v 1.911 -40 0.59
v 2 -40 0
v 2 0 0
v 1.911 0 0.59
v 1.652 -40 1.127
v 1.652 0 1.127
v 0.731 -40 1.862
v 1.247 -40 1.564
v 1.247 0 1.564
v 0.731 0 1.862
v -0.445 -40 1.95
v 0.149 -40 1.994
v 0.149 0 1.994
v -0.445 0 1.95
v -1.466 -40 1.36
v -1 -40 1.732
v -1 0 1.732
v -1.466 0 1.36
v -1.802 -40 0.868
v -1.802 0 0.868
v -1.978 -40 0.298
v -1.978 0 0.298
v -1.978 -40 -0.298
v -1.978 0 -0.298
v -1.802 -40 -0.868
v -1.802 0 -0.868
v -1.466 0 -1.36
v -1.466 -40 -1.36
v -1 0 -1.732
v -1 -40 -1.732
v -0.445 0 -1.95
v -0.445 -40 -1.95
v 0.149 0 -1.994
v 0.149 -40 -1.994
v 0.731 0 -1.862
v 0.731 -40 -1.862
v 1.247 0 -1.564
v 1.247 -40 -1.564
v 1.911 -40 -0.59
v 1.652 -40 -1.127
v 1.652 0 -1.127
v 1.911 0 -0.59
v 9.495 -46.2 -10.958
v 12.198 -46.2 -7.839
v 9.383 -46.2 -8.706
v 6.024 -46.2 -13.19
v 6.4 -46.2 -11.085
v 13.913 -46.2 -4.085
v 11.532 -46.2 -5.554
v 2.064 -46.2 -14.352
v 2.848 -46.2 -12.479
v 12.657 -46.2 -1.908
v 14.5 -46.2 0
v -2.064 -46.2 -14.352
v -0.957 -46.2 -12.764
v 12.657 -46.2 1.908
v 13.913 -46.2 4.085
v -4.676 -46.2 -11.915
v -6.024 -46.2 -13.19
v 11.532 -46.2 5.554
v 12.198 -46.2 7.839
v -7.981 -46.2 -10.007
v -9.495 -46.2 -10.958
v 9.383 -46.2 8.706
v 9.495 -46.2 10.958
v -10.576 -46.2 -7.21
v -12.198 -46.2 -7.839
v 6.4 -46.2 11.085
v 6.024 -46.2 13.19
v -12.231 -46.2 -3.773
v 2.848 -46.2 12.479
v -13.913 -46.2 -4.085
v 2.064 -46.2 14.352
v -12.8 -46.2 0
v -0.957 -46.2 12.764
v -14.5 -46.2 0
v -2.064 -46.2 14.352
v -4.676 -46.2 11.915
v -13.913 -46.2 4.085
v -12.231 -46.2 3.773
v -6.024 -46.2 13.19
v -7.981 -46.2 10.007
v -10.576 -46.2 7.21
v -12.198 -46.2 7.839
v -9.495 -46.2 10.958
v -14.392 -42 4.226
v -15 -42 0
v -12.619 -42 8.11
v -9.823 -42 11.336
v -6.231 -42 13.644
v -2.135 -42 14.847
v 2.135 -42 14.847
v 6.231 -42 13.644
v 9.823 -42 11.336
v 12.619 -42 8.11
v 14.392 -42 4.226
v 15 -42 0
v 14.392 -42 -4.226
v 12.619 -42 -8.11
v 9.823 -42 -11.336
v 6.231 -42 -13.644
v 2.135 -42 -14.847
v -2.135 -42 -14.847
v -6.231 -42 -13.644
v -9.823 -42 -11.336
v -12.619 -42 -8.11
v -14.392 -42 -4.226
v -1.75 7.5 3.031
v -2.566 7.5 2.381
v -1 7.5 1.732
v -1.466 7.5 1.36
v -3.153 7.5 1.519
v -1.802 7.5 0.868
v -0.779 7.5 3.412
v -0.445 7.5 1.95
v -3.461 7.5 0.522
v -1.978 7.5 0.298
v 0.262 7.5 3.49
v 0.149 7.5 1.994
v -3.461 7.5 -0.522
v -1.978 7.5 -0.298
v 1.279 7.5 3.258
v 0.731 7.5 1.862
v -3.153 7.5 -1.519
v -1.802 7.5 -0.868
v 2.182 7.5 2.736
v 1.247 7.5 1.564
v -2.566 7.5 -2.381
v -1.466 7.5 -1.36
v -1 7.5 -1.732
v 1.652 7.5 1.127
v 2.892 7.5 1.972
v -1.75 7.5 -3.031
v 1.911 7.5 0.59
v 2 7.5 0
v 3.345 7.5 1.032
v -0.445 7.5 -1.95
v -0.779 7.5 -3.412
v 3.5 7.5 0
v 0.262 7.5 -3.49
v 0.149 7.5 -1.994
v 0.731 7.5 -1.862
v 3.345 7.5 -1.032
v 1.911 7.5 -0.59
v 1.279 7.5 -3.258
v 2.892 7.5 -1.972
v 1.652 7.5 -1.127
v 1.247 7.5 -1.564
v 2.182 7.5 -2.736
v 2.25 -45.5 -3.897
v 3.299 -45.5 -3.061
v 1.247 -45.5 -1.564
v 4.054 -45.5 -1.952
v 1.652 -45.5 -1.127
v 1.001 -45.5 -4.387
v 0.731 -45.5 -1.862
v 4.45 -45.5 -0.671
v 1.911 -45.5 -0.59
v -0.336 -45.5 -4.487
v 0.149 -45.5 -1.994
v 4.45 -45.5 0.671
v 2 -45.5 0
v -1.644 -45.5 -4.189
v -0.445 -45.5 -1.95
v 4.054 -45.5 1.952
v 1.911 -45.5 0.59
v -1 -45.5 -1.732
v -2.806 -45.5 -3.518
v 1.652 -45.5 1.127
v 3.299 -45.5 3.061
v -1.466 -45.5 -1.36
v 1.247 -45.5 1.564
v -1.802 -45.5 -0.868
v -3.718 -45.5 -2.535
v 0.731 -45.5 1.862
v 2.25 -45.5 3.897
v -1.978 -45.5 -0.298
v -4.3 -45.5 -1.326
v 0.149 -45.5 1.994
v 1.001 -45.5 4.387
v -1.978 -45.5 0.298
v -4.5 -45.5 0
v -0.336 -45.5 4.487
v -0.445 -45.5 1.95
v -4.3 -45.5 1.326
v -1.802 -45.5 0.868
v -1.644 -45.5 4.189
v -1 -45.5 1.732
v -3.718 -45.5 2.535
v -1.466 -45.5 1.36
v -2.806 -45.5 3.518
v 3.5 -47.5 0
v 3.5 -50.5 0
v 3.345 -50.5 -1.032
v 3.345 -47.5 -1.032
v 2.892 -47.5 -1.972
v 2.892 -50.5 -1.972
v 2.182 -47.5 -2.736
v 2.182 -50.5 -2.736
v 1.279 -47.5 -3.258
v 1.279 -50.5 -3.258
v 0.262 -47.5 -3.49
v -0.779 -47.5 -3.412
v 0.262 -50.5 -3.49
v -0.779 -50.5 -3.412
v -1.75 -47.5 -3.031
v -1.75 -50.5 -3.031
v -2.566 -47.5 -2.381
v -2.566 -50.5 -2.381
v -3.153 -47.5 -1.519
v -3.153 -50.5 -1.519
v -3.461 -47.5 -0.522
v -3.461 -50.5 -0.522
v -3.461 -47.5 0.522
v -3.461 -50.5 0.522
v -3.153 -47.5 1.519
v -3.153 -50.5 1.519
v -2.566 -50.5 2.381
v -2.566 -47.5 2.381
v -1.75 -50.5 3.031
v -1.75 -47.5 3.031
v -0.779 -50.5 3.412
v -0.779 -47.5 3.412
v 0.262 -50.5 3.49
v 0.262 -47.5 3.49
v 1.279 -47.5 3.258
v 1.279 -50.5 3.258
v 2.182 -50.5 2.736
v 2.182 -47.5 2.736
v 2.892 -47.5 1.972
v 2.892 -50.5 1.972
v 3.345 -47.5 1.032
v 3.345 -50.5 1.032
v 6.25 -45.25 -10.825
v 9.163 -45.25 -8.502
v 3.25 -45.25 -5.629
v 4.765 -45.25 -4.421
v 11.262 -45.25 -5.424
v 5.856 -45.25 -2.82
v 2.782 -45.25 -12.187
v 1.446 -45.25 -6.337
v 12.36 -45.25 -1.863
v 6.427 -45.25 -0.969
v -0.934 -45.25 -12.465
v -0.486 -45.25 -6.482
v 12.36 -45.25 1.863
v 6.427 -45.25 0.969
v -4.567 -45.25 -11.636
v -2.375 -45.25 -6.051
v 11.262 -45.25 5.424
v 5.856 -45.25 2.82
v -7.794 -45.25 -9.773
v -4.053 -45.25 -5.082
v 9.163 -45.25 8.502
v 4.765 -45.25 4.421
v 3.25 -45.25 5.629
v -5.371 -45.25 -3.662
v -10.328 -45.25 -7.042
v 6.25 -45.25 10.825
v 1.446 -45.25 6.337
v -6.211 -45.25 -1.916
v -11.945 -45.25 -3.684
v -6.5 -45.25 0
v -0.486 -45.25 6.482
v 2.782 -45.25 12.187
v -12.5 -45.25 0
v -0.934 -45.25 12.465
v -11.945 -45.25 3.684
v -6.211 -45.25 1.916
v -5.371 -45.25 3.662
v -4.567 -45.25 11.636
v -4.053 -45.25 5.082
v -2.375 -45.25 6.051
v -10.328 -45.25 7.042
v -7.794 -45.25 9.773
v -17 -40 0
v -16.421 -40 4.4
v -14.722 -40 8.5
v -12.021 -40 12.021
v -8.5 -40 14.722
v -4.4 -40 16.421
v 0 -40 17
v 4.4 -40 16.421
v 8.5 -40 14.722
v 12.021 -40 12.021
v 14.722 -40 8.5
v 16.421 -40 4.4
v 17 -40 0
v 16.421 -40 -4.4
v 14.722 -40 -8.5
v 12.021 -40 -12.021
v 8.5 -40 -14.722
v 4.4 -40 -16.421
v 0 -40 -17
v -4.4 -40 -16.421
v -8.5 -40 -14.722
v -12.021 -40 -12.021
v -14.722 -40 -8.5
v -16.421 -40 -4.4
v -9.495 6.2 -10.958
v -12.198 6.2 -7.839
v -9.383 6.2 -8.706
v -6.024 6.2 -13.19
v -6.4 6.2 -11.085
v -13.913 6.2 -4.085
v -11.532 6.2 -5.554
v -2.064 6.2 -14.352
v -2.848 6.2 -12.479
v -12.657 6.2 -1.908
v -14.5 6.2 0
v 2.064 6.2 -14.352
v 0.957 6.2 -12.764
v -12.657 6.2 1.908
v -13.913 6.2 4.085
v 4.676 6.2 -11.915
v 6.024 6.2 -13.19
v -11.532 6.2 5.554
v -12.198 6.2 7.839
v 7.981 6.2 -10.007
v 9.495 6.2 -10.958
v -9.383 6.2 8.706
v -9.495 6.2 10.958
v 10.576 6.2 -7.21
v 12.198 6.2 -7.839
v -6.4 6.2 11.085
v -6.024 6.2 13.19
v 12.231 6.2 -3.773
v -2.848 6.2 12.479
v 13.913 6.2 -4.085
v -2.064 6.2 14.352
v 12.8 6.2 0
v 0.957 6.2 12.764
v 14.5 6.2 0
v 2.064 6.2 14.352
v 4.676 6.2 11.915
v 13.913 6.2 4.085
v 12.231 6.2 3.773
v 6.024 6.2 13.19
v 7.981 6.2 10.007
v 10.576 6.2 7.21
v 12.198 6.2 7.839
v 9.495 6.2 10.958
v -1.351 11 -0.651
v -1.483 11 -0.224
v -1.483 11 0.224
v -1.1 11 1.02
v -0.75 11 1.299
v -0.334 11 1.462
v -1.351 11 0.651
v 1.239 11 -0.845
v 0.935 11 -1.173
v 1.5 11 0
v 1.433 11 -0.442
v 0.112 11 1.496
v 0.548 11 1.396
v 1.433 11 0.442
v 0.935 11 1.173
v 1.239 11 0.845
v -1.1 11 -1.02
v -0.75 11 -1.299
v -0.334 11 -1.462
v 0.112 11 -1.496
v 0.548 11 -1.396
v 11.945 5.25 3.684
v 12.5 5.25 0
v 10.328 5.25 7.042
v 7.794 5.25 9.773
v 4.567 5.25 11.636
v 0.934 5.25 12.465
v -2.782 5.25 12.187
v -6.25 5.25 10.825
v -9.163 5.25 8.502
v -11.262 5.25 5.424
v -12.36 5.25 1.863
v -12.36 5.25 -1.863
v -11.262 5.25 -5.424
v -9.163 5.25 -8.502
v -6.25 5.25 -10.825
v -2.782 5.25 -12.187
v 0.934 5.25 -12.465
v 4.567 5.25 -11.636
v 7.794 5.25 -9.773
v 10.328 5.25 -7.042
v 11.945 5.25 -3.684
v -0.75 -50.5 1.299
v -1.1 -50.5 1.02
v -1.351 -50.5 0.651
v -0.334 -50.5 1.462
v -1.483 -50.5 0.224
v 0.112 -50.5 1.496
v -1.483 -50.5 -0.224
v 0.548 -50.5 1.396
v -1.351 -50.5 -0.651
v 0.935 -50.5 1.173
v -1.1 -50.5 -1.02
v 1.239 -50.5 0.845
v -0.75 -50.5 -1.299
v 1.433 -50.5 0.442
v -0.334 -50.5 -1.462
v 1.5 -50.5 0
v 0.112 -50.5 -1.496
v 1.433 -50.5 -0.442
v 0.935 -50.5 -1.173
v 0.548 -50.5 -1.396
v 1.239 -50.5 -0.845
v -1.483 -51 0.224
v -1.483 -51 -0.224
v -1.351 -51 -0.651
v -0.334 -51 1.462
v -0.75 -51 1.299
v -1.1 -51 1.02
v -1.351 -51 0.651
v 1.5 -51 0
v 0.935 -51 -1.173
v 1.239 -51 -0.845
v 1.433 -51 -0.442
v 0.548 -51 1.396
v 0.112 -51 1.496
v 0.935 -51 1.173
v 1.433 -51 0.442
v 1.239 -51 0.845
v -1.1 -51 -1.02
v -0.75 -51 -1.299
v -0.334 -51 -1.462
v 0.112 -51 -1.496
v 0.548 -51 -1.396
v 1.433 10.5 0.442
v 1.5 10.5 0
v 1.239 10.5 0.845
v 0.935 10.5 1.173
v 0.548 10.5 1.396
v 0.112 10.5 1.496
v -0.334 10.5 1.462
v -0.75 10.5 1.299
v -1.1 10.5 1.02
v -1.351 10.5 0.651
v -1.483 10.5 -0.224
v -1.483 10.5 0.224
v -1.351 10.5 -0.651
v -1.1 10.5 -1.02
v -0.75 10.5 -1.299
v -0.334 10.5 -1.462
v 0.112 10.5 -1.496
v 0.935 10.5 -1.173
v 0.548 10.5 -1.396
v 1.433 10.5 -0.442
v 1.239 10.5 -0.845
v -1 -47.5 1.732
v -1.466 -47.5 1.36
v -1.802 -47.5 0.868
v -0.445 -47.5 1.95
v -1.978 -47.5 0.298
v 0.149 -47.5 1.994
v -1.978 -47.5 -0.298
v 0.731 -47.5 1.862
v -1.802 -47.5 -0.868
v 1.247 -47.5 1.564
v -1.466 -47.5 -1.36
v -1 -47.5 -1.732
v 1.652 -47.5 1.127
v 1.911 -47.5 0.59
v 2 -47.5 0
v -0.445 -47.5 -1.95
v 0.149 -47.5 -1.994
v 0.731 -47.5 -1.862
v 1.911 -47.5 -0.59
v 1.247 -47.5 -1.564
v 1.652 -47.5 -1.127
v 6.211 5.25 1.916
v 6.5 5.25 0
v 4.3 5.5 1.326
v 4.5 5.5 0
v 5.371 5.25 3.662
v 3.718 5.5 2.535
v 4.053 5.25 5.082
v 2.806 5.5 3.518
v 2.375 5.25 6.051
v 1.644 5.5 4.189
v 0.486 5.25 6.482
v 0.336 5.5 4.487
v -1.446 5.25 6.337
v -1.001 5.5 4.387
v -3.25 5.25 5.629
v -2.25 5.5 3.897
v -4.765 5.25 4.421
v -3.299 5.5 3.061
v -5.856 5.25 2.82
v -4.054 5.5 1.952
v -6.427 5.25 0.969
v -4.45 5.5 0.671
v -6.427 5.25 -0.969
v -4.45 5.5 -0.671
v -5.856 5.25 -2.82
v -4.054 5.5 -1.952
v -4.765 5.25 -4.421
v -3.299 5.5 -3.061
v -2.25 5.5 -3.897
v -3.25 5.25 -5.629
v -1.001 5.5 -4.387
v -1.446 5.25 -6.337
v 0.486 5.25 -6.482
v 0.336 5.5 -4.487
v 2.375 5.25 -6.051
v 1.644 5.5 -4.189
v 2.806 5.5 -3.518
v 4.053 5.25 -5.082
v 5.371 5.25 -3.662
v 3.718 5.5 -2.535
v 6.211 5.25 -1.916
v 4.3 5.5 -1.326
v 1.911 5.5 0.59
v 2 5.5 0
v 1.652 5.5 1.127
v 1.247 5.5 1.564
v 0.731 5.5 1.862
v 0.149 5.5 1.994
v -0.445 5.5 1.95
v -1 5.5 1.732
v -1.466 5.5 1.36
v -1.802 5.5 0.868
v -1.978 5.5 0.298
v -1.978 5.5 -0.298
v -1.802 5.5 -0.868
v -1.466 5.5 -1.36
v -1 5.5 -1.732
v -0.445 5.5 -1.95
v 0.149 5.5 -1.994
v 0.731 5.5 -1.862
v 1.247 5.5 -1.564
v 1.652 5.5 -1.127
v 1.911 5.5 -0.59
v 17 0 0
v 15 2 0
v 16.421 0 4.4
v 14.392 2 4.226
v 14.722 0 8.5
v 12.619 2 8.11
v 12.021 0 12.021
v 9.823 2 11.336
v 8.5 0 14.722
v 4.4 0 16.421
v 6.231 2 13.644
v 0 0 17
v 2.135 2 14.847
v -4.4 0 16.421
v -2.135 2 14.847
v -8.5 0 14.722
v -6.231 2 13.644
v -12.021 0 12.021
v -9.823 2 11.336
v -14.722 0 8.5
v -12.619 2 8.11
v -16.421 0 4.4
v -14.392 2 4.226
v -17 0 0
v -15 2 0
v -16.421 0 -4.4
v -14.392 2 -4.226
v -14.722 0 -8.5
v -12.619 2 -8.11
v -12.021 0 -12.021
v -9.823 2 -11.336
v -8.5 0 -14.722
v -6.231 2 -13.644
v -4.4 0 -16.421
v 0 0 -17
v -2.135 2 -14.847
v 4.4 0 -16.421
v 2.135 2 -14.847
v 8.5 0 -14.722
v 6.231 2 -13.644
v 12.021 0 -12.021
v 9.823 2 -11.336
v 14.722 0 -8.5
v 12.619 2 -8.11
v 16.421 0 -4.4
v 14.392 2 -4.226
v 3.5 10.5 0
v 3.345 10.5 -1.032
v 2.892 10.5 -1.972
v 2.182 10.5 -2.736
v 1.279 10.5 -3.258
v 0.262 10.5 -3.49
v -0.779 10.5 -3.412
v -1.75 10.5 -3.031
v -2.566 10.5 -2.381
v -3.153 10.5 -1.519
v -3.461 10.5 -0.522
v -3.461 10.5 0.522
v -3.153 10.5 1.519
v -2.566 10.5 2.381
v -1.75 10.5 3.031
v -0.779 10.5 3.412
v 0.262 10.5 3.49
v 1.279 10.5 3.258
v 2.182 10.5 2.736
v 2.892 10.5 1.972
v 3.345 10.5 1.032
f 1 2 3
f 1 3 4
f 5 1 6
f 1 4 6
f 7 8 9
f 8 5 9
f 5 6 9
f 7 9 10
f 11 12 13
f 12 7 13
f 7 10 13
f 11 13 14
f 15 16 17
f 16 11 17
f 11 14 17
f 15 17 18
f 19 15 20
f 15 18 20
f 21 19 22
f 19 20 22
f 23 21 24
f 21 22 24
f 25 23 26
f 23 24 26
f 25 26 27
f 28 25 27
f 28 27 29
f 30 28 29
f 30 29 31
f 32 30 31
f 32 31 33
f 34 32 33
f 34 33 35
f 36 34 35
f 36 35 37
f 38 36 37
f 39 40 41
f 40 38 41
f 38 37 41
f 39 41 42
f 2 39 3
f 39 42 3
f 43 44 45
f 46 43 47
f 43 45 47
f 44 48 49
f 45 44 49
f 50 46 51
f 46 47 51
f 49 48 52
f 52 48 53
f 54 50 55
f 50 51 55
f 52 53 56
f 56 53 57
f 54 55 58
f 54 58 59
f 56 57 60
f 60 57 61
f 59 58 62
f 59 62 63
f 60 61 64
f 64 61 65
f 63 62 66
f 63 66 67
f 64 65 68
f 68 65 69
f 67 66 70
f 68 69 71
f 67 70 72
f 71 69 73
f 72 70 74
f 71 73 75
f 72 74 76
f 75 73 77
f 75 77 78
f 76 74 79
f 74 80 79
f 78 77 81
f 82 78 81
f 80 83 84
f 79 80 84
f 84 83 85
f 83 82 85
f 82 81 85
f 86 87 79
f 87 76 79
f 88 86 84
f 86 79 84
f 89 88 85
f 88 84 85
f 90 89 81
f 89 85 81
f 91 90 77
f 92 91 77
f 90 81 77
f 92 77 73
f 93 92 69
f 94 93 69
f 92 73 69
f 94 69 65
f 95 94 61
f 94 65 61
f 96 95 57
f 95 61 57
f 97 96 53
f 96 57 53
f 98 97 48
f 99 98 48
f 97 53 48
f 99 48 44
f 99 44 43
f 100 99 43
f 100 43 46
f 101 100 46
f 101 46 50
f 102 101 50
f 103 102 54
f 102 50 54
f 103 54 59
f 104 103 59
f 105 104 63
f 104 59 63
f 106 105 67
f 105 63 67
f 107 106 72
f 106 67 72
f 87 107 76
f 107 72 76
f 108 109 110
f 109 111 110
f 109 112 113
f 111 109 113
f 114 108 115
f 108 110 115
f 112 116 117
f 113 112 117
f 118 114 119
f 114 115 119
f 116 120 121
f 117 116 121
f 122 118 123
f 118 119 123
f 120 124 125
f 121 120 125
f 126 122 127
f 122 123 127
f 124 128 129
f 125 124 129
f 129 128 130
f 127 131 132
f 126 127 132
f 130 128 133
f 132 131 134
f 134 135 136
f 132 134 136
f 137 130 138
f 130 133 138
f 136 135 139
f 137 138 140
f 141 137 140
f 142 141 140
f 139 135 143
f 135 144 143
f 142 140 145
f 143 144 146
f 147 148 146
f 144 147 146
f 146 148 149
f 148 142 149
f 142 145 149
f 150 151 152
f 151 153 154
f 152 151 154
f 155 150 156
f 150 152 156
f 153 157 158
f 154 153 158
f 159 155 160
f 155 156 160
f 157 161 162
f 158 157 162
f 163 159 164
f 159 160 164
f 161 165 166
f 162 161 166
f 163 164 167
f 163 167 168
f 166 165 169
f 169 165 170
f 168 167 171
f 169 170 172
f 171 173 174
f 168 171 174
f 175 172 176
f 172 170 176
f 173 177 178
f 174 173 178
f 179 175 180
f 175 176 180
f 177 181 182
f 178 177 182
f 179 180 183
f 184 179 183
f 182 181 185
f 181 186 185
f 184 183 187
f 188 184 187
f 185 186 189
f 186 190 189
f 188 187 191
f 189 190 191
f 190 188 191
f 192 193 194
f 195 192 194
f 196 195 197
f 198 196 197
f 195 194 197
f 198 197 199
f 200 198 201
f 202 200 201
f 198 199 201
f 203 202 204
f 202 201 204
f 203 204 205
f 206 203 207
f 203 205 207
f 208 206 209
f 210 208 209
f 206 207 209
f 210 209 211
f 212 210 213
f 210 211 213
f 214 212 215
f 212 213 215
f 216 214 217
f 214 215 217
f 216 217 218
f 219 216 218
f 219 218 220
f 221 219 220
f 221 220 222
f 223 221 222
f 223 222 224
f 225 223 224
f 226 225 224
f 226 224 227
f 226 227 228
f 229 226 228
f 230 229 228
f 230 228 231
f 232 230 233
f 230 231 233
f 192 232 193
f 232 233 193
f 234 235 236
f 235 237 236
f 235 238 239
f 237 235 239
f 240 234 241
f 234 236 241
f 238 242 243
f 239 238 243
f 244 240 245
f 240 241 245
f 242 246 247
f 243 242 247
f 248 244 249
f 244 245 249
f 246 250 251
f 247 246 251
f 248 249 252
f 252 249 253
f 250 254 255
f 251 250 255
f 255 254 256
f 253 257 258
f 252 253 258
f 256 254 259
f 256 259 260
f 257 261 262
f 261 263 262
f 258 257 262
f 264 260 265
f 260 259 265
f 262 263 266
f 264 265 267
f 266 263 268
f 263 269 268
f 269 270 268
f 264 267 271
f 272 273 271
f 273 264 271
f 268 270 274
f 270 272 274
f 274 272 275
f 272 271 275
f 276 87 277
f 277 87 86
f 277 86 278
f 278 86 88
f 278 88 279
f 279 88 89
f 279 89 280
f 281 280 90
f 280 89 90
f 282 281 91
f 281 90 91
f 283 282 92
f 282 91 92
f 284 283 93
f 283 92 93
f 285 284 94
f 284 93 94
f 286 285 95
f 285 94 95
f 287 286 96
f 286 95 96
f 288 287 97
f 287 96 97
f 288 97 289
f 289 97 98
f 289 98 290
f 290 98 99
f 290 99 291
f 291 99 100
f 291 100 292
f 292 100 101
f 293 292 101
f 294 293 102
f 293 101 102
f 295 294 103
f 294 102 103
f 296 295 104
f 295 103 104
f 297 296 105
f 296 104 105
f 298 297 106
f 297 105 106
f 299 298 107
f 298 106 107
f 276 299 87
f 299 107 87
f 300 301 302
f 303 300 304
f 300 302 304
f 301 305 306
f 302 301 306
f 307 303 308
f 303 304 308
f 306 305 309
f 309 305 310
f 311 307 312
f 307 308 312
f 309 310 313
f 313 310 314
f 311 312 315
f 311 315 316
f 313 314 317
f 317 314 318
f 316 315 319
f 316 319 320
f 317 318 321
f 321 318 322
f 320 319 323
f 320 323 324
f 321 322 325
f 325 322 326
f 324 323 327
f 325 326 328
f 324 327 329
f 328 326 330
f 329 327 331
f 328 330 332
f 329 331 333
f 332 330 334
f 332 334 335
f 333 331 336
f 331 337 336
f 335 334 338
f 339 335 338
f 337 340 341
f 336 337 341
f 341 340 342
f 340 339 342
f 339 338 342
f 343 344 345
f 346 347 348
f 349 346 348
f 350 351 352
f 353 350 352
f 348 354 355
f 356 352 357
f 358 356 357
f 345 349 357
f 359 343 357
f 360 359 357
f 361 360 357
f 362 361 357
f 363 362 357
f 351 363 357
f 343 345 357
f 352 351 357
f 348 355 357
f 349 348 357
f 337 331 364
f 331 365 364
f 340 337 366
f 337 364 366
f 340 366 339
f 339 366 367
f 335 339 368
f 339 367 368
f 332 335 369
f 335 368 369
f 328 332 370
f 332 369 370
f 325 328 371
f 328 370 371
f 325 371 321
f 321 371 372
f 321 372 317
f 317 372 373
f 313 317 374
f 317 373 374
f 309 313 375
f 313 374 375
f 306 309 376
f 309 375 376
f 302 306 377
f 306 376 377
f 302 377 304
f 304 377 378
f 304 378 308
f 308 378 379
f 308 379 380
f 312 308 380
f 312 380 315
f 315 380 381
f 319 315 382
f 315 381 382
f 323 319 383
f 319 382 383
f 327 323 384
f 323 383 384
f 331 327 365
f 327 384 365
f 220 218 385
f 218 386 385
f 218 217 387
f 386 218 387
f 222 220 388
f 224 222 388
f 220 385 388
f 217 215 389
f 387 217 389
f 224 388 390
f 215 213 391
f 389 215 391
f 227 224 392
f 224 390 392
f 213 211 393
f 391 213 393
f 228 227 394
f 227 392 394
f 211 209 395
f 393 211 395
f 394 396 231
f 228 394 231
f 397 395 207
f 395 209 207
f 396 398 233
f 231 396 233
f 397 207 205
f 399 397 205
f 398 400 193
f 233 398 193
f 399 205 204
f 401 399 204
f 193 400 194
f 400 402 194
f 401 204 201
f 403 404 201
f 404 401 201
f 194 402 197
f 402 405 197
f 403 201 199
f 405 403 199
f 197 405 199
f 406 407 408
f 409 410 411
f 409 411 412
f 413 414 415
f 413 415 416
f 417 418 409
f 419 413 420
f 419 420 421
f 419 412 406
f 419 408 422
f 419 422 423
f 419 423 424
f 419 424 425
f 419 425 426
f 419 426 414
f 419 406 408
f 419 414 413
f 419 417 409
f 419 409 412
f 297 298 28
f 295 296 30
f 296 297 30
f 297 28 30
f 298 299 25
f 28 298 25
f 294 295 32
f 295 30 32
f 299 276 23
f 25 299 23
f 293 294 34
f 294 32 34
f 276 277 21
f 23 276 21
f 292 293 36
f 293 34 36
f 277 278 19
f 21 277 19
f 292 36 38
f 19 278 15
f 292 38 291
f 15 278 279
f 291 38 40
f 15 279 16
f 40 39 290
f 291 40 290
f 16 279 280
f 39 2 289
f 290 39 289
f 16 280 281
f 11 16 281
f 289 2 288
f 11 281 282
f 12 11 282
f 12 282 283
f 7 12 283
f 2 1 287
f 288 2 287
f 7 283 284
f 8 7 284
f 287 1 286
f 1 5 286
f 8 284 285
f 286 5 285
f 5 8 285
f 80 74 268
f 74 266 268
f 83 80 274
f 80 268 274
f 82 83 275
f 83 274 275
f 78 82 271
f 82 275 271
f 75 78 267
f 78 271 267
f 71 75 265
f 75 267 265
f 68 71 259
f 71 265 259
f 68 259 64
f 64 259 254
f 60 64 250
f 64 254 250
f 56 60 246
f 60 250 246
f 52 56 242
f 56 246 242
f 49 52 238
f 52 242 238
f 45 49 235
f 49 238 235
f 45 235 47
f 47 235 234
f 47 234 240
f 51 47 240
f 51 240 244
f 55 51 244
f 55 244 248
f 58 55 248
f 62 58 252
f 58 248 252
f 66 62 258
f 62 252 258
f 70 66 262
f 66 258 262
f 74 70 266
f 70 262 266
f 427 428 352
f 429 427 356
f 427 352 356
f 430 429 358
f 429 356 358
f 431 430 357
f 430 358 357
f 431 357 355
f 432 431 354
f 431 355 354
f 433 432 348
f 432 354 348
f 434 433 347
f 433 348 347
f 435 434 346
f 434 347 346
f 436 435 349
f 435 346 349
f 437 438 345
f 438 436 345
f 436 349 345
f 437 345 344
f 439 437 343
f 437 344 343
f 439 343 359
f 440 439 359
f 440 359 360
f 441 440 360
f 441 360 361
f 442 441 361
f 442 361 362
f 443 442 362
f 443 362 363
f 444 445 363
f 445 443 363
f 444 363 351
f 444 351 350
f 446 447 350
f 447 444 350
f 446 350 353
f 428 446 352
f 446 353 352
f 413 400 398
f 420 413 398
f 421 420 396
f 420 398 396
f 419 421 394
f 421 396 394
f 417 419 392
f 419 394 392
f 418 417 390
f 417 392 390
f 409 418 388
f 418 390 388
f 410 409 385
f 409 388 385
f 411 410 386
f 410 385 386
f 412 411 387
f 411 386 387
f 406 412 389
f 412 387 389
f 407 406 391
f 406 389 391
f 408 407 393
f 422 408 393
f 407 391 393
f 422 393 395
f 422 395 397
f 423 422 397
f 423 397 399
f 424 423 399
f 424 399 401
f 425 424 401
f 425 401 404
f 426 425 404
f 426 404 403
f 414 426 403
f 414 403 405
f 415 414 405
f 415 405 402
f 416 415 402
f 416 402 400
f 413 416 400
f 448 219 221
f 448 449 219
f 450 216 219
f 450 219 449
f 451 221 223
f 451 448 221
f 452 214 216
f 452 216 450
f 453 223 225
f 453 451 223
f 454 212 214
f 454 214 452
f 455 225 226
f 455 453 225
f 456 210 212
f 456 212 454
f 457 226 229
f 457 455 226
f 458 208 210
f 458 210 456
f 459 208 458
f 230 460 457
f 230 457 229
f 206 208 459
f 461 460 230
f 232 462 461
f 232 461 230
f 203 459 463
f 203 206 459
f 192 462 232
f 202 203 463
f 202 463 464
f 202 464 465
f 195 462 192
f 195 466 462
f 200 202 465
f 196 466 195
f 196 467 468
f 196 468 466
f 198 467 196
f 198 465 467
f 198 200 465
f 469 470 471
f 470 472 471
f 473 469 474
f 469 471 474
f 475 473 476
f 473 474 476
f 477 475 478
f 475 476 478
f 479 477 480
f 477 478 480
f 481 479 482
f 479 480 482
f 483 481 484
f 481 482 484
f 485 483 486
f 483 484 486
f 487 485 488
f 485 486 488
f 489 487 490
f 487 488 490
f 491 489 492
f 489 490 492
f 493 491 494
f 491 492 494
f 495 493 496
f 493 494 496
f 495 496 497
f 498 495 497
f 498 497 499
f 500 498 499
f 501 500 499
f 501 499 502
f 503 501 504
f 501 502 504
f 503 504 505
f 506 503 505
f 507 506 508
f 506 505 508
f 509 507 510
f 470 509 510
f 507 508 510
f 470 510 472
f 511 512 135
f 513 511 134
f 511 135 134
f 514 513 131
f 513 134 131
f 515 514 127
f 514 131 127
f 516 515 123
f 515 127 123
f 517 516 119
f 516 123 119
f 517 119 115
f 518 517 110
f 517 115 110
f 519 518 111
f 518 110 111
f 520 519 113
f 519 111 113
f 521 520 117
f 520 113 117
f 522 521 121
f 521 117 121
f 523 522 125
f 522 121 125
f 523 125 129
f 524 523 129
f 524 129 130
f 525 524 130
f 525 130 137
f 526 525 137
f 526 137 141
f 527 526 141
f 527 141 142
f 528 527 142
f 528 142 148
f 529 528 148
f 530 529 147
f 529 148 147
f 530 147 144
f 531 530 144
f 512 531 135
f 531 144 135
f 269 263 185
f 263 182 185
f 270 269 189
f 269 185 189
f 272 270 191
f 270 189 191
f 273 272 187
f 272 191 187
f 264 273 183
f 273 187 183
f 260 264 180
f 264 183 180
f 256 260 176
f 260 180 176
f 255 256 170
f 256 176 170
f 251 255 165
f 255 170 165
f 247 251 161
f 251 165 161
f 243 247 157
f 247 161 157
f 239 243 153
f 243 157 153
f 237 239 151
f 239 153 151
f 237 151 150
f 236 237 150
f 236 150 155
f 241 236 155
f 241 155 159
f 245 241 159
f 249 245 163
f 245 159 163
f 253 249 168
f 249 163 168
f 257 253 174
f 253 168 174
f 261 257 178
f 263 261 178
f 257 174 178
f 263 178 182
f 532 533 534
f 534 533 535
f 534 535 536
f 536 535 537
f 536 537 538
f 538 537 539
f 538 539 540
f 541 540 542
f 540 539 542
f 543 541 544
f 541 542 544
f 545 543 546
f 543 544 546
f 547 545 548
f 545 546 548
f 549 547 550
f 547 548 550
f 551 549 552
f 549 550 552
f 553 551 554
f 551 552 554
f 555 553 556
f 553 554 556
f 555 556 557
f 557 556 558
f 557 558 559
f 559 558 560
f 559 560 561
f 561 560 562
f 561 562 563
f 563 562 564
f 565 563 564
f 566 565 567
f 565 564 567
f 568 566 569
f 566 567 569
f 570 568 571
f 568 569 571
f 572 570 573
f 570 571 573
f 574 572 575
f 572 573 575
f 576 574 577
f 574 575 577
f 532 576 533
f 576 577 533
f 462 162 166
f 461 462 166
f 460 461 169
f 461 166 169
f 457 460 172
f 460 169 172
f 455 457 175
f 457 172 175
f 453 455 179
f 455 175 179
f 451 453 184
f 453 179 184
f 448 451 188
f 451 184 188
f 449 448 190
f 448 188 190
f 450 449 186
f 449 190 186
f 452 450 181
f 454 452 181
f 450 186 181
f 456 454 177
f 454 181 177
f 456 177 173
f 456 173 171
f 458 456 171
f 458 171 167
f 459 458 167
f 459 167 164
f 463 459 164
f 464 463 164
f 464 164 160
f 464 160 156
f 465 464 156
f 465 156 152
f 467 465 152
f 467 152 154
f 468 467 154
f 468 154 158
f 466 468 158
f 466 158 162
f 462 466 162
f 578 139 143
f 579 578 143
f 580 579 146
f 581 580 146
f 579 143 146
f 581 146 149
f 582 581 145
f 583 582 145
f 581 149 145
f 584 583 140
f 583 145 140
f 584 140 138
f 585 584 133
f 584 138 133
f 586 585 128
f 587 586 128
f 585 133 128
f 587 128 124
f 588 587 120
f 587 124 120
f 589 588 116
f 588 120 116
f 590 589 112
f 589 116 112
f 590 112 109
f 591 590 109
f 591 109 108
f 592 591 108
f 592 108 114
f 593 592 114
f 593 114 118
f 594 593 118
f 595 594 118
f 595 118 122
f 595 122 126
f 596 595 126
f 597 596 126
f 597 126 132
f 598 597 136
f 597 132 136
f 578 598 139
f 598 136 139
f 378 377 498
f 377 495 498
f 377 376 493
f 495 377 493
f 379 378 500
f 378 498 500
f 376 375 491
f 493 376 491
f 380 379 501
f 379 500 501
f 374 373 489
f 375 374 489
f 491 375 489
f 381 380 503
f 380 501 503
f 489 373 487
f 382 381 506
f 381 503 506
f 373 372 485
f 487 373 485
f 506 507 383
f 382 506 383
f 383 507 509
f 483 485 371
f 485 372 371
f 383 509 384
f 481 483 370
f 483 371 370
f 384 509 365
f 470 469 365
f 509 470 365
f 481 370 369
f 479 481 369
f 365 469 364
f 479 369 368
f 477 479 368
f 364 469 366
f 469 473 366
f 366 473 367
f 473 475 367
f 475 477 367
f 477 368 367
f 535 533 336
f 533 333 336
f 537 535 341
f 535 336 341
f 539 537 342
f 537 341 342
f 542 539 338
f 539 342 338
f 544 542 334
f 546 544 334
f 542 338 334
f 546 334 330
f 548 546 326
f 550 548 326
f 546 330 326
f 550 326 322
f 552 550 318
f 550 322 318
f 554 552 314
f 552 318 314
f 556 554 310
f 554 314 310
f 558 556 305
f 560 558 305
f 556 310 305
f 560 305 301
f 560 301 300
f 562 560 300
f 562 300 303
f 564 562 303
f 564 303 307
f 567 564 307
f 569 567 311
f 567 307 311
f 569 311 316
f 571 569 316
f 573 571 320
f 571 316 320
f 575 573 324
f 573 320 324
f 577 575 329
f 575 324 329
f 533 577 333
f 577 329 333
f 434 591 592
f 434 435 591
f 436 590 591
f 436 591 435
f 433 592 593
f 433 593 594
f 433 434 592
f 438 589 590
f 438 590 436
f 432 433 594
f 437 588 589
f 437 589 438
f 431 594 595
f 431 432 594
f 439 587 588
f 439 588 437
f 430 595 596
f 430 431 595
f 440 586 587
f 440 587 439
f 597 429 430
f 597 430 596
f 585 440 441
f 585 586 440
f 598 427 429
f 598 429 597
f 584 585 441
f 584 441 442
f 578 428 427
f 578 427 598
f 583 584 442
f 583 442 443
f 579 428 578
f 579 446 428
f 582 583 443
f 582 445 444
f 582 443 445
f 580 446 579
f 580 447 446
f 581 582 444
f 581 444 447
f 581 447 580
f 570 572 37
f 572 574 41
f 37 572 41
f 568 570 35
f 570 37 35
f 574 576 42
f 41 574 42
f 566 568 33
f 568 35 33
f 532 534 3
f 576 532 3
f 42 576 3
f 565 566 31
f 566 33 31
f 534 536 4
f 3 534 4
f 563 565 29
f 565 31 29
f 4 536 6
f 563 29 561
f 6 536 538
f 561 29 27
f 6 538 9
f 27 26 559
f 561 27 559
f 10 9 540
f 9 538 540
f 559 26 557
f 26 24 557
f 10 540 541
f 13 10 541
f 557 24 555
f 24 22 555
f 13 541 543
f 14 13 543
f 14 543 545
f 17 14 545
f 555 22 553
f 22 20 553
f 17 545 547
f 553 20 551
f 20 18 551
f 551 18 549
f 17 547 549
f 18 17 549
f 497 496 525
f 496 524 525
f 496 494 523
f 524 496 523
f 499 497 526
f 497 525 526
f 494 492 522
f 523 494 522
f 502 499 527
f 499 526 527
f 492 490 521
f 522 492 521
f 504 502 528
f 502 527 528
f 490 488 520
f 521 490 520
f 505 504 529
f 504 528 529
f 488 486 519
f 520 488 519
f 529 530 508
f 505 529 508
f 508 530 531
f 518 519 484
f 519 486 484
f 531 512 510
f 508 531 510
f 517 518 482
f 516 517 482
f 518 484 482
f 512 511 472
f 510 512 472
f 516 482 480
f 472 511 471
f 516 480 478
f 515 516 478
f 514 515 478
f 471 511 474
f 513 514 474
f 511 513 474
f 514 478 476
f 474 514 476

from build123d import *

# Parameters (mm, degrees)
CYLINDER017_R          = 2
CYLINDER017_DEPTH      = 10
CUT011_PLACEMENT_ANGLE = 180
CYLINDER020_R          = 2
CYLINDER020_DEPTH      = 55
CYLINDER021_R          = 1.5
CYLINDER021_DEPTH      = 62
TUBE008_R              = 3.5
TUBE008_R_2            = 1.5
TUBE008_DEPTH          = 3
TUBE009_R              = 3.5
TUBE009_R_2            = 1.5
TUBE009_DEPTH          = 3
CYLINDER016_R          = 2
CYLINDER016_DEPTH      = 10


with BuildPart() as cylinder017:
    # Cylinder017 → Cylinder017 (new body)
    with BuildSketch(Plane.XZ.offset(-8)):
        Circle(CYLINDER017_R)
    extrude(amount=CYLINDER017_DEPTH)


with BuildPart() as rad_b:
    # Sketch005 → Revolve002 (revolve)
    with BuildSketch(Plane.XY):
        Polygon((0, 0), (17, 0), (15, 2), (14.5, 6.2), (12.8, 6.2), (12.5, 5.25), (6.5, 5.25), (4.5, 5.5), (0, 5.5), align=None)
    revolve(axis=Axis((0, 0, 0), (0, -1, 0)))

    # Cut011: cut Cylinder017
    add(cylinder017.part, mode=Mode.SUBTRACT)


with BuildPart() as rad_b_1:
    # Cut011 placement: moved
    add(rad_b.part.moved(Location((0, -40, 0))).rotate(Axis((0, -40, 0), (0, 0, 1)), CUT011_PLACEMENT_ANGLE))


with BuildPart() as cylinder020:
    # Cylinder020 → Cylinder020 (new body)
    with BuildSketch(Plane.XZ.offset(-7.5)):
        Circle(CYLINDER020_R)
    extrude(amount=CYLINDER020_DEPTH)


with BuildPart() as achse_a:
    # Cylinder021 → Cylinder021 (new body)
    with BuildSketch(Plane.XZ.offset(-11)):
        Circle(CYLINDER021_R)
    extrude(amount=CYLINDER021_DEPTH)

    # Fusion031: union Cylinder020
    add(cylinder020.part)


with BuildPart() as kula_a:
    # Tube008 → Tube008 (new body)
    with BuildSketch(Plane(origin=(0, 7.5, 0), x_dir=(1, 0, 0), z_dir=(0, 1, 0))):
        Circle(TUBE008_R)
        Circle(TUBE008_R_2, mode=Mode.SUBTRACT)
    extrude(amount=TUBE008_DEPTH)


with BuildPart() as kula_b:
    # Tube009 → Tube009 (new body)
    with BuildSketch(Plane(origin=(0, -50.5, 0), x_dir=(1, 0, 0), z_dir=(0, 1, 0))):
        Circle(TUBE009_R)
        Circle(TUBE009_R_2, mode=Mode.SUBTRACT)
    extrude(amount=TUBE009_DEPTH)


with BuildPart() as cylinder016:
    # Cylinder016 → Cylinder016 (new body)
    with BuildSketch(Plane.XZ.offset(-8)):
        Circle(CYLINDER016_R)
    extrude(amount=CYLINDER016_DEPTH)


with BuildPart() as radsatz_a:
    # Sketch005 → Revolve001 (revolve)
    with BuildSketch(Plane.XY):
        Polygon((0, 0), (17, 0), (15, 2), (14.5, 6.2), (12.8, 6.2), (12.5, 5.25), (6.5, 5.25), (4.5, 5.5), (0, 5.5), align=None)
    revolve(axis=Axis((0, 0, 0), (0, -1, 0)))

    # Cut010: cut Cylinder016
    add(cylinder016.part, mode=Mode.SUBTRACT)

    # Fusion078: union Rad-B, Achse-A, KuLa-A, KuLa-B
    add(rad_b_1.part)
    add(achse_a.part)
    add(kula_a.part)
    add(kula_b.part)


solid = radsatz_a.part
